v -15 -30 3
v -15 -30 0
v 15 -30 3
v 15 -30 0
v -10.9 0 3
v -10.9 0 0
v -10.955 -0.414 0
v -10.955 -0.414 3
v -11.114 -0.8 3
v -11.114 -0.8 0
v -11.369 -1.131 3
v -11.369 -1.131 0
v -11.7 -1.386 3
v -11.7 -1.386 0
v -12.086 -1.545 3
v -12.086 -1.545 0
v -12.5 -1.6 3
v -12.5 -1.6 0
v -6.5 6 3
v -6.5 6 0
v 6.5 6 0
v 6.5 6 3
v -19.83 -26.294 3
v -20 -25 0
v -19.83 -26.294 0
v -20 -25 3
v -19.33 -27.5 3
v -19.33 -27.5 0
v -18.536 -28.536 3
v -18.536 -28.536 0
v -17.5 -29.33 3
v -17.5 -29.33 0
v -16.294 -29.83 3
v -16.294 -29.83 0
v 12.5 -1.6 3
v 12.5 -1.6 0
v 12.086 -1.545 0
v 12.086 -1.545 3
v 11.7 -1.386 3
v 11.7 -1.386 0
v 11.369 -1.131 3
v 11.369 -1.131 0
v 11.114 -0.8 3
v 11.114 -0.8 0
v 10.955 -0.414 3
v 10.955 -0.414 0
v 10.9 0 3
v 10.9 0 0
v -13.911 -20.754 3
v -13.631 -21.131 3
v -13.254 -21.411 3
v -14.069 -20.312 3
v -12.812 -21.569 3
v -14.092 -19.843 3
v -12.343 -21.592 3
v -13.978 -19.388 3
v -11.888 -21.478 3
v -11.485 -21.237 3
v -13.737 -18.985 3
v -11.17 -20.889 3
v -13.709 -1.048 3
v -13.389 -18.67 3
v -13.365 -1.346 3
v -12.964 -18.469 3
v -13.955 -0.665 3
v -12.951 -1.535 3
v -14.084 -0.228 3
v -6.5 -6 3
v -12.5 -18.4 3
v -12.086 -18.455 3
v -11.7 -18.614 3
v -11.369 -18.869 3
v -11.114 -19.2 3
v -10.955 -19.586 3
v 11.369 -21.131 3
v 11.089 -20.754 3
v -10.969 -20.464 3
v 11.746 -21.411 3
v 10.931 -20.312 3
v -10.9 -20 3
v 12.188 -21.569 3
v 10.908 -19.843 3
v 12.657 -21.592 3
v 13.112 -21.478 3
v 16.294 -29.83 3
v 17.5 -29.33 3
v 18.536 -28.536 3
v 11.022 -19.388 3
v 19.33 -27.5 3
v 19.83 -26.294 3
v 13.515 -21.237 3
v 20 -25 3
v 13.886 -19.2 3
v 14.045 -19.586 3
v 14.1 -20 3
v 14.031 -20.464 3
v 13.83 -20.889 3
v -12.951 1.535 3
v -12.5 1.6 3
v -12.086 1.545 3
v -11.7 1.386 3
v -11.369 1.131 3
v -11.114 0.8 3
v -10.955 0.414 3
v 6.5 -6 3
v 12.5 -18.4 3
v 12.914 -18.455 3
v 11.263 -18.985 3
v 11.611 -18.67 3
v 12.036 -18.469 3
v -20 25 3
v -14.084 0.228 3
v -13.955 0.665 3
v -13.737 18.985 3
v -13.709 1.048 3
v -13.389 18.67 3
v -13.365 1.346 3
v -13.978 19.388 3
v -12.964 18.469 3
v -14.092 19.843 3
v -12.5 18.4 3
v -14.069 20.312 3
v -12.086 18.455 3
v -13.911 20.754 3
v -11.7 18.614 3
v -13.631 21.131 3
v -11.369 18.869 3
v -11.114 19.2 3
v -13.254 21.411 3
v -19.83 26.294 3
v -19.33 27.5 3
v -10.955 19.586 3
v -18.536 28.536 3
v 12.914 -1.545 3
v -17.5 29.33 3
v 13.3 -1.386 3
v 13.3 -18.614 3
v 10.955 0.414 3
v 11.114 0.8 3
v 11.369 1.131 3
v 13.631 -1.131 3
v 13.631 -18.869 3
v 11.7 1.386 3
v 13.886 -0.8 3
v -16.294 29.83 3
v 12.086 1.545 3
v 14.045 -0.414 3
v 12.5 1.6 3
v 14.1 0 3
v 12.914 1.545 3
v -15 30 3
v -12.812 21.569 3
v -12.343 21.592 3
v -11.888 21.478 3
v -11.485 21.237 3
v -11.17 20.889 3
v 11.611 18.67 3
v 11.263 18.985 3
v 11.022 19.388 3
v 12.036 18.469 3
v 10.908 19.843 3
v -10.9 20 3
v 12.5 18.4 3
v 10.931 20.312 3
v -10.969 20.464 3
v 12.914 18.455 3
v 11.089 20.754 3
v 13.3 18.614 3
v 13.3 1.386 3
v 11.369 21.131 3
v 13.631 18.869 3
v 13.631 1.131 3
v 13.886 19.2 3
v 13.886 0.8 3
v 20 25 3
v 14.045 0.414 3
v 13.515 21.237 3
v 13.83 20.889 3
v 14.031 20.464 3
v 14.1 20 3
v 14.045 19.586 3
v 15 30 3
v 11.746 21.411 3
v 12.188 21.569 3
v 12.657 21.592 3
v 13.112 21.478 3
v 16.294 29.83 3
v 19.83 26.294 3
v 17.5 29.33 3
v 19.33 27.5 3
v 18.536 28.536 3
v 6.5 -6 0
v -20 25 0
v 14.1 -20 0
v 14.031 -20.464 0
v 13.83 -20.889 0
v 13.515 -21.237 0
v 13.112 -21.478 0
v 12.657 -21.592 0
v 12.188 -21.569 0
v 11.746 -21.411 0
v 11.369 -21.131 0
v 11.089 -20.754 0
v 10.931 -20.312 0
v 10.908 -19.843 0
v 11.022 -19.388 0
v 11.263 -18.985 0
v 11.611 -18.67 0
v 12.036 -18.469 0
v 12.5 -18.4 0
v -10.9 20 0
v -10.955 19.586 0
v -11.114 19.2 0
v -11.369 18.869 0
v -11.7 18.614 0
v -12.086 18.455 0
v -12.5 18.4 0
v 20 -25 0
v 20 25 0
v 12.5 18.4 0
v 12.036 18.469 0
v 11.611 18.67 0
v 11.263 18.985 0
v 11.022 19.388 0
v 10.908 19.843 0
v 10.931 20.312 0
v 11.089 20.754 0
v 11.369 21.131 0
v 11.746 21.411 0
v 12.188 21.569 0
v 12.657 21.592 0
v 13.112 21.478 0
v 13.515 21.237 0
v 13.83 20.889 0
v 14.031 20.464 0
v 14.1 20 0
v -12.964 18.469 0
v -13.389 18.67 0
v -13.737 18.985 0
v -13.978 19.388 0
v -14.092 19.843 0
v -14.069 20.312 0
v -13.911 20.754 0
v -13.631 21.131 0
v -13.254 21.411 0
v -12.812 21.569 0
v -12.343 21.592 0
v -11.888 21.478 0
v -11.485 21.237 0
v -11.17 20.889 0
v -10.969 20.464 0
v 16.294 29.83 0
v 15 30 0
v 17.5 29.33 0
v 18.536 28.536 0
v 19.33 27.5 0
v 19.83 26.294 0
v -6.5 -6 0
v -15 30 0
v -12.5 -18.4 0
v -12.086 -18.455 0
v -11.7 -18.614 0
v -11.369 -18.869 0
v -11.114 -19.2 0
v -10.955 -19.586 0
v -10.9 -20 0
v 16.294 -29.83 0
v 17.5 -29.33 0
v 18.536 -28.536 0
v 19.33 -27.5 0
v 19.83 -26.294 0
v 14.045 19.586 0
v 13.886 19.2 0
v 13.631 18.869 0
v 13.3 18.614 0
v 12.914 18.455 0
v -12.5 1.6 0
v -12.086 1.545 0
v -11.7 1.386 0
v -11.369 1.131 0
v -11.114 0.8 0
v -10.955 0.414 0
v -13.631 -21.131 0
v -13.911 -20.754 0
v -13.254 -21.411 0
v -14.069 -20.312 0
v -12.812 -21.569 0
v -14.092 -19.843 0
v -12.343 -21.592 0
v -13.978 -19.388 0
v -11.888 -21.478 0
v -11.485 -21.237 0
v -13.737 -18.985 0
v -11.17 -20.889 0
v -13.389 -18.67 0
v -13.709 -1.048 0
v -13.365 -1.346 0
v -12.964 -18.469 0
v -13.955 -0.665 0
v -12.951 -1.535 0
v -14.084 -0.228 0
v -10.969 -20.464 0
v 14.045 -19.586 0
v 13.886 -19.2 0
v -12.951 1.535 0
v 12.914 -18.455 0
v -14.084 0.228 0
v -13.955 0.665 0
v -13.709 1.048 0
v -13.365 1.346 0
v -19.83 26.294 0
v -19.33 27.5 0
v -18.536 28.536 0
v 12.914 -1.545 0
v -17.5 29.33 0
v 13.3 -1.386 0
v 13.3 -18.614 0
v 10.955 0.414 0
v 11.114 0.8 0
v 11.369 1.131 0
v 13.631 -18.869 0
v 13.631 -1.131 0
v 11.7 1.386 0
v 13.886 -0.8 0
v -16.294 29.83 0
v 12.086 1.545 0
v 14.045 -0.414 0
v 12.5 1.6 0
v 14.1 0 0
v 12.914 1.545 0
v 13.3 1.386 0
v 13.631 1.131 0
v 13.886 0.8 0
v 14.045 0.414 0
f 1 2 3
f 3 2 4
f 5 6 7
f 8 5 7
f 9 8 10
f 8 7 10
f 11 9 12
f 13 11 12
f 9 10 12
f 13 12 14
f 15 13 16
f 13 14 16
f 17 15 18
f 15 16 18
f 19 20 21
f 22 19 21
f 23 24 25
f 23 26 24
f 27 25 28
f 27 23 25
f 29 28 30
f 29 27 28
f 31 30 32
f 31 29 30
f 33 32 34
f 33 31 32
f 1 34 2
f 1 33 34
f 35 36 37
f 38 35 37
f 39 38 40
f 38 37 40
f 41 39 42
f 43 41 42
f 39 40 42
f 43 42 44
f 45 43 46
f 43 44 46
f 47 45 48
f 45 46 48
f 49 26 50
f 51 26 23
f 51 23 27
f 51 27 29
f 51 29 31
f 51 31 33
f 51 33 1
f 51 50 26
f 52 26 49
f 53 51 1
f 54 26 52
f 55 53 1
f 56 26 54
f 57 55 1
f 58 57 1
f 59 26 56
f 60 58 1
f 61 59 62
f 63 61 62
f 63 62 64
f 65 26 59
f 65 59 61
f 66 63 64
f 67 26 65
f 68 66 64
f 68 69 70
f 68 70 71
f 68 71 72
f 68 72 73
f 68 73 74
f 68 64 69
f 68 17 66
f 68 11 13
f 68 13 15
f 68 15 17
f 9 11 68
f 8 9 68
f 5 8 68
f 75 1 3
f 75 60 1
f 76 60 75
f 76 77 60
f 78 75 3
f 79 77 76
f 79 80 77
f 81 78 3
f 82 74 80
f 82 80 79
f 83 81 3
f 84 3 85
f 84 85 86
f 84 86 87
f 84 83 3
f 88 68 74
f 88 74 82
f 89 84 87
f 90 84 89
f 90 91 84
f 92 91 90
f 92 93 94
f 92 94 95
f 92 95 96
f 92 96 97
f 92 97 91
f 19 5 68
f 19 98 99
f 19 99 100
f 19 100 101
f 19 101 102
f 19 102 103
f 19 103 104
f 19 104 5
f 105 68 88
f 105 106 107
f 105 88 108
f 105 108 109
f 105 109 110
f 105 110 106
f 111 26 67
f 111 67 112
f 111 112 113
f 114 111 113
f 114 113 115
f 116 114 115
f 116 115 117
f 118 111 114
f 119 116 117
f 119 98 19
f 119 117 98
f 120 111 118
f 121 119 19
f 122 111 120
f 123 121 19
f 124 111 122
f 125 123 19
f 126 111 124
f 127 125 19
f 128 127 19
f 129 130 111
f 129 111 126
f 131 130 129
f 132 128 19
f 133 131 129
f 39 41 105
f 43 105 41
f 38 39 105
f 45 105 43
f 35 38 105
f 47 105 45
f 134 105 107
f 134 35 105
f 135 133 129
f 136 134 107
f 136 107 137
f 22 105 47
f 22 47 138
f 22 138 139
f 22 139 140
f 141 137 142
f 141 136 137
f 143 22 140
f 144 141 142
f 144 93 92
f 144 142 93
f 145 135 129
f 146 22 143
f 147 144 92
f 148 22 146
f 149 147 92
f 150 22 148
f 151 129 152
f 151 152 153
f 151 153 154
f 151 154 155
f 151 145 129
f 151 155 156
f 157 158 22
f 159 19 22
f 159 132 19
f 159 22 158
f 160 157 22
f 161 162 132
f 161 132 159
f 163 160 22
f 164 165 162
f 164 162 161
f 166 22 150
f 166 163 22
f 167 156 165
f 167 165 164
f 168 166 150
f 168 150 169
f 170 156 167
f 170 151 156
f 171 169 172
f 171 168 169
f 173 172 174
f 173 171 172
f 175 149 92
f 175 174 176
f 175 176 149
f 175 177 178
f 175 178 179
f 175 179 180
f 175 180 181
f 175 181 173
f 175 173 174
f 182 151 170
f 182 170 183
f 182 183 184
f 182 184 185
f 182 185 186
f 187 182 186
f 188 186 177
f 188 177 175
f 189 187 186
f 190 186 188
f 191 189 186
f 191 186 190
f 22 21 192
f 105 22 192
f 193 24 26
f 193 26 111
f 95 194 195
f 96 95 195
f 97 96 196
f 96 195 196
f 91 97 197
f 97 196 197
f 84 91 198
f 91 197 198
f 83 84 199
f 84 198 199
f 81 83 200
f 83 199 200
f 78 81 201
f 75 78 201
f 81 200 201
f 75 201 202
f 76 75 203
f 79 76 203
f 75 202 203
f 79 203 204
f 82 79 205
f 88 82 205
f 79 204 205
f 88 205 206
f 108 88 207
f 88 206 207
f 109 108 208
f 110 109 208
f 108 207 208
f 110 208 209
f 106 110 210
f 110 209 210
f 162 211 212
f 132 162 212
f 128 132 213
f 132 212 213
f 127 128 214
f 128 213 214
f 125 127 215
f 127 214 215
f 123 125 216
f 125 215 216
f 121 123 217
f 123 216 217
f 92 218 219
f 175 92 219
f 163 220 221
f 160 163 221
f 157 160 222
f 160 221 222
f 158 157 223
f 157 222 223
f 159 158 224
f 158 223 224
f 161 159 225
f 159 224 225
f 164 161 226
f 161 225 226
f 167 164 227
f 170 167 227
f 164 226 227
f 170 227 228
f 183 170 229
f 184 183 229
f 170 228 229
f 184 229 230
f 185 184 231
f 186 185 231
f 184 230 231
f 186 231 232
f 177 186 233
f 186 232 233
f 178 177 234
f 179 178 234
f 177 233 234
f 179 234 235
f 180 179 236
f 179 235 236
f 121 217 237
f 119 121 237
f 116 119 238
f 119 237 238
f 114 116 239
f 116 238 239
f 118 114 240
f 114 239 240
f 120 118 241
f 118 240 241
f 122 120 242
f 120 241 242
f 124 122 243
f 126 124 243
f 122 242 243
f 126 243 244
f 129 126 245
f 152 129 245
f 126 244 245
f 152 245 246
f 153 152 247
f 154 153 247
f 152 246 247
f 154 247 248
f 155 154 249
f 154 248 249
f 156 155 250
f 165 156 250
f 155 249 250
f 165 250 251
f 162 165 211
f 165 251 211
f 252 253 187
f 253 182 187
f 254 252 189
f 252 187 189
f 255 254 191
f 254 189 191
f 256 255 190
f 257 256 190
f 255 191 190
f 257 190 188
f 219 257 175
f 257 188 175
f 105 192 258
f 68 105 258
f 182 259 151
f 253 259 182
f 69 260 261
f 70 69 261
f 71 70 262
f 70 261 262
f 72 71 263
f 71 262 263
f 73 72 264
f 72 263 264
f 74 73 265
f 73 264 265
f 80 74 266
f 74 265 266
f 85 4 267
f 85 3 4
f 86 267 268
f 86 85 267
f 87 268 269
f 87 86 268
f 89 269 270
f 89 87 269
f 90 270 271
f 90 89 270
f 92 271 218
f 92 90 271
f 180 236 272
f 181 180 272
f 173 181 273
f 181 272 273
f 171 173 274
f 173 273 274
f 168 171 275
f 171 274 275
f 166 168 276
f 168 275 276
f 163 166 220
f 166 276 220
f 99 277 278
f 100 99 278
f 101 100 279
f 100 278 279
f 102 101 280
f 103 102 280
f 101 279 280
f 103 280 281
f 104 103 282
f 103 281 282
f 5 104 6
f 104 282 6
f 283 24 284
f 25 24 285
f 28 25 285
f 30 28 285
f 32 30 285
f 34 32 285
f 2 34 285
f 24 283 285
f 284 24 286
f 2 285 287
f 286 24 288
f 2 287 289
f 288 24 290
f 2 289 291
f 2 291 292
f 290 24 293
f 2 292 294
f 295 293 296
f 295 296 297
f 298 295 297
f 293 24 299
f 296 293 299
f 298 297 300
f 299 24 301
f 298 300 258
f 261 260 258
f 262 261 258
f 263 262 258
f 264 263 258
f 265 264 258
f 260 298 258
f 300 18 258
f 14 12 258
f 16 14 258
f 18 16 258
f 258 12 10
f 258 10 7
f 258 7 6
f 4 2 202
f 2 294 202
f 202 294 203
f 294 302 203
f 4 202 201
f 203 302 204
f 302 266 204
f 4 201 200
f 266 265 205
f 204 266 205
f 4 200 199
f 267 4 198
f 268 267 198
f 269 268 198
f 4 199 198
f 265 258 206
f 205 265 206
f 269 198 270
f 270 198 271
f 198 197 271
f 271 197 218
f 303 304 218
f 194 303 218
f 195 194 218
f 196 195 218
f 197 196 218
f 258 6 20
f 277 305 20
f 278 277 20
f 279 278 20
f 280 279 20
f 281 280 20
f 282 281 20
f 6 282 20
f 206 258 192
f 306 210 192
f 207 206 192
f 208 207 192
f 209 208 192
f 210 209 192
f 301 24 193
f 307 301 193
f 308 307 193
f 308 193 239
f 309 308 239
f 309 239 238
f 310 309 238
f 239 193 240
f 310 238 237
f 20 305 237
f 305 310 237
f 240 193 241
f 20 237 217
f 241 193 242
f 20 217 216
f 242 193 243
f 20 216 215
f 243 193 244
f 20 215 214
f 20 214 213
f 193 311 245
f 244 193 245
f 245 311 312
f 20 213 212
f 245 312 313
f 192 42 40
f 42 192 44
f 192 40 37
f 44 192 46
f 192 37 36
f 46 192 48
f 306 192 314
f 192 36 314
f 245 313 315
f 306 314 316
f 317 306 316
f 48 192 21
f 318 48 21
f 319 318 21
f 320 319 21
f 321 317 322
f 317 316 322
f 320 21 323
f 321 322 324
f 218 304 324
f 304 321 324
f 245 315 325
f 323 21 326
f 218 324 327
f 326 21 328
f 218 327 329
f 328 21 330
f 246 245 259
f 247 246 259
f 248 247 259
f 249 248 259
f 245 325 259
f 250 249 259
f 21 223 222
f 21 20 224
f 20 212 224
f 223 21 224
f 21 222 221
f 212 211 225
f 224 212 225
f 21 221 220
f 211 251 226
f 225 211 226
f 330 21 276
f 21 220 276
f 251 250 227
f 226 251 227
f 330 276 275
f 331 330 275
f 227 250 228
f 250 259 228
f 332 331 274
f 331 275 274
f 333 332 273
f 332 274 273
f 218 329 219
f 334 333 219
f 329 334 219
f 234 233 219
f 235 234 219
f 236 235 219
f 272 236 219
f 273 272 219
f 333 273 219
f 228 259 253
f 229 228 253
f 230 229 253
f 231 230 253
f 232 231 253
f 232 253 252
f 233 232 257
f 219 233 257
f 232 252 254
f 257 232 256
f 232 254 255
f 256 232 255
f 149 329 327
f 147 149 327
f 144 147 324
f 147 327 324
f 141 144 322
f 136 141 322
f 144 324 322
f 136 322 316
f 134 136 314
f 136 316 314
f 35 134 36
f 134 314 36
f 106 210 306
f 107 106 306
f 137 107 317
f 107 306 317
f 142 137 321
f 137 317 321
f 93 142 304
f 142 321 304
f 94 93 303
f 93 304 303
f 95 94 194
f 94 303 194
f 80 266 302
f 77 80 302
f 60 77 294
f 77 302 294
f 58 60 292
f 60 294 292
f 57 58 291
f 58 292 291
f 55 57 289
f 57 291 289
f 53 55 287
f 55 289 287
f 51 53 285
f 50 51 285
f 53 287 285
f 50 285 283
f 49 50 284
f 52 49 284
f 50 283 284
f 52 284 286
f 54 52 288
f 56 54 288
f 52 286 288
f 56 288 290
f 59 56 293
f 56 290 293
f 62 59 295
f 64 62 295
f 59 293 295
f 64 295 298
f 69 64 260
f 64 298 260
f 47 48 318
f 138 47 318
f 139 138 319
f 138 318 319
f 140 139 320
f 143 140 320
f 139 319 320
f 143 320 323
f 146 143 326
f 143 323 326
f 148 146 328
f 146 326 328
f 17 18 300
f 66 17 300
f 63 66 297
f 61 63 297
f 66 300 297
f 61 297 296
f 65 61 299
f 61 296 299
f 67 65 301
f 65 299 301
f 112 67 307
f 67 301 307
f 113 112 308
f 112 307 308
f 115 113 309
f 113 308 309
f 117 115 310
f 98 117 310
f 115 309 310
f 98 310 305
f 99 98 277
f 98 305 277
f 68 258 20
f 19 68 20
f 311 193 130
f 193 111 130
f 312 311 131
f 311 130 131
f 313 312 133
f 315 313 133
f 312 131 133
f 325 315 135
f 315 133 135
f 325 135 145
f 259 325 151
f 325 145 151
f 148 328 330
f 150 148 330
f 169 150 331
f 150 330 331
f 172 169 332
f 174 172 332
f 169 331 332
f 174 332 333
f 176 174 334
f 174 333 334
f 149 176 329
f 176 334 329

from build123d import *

# Parameters (mm, degrees)
F0_W     = 40
F0_H     = 60
F1_DEPTH = 3
F2_R     = 5


with BuildPart() as f1:
    # F0 (on Top) → F1 (new body)
    with BuildSketch(Plane.XY):
        Rectangle(F0_W, F0_H)
        with BuildLine():
            ThreePointArc((-10.9, -20), (-13.6313708499, -21.1313708499), (-12.5, -18.4))
            ThreePointArc((-12.5, -18.4), (-11.3686291501, -18.8686291501), (-10.9, -20))
        make_face(mode=Mode.SUBTRACT)
        with BuildLine():
            ThreePointArc((14.1, -20), (11.3686291501, -21.1313708499), (12.5, -18.4))
            ThreePointArc((12.5, -18.4), (13.6313708499, -18.8686291501), (14.1, -20))
        make_face(mode=Mode.SUBTRACT)
        with BuildLine():
            ThreePointArc((-12.5, 1.6), (-11.3686291501, 1.1313708499), (-10.9, 0))
            ThreePointArc((-10.9, 0), (-11.3686291501, -1.1313708499), (-12.5, -1.6))
            ThreePointArc((-12.5, -1.6), (-14.1, 0), (-12.5, 1.6))
        make_face(mode=Mode.SUBTRACT)
        with BuildLine():
            ThreePointArc((-10.9, 20), (-11.3686291501, 18.8686291501), (-12.5, 18.4))
            ThreePointArc((-12.5, 18.4), (-13.6313708499, 21.1313708499), (-10.9, 20))
        make_face(mode=Mode.SUBTRACT)
        Polygon((6.5, 6), (6.5, 0), (6.5, -6), (-6.5, -6), (-6.5, 0), (-6.5, 6), align=None, mode=Mode.SUBTRACT)
        with BuildLine():
            ThreePointArc((12.5, -1.6), (11.3686291501, -1.1313708499), (10.9, 0))
            ThreePointArc((10.9, 0), (11.3686291501, 1.1313708499), (12.5, 1.6))
            ThreePointArc((12.5, 1.6), (13.6313708499, 1.1313708499), (14.1, 0))
            ThreePointArc((14.1, 0), (13.6313708499, -1.1313708499), (12.5, -1.6))
        make_face(mode=Mode.SUBTRACT)
        with BuildLine():
            ThreePointArc((14.1, 20), (13.6313708499, 18.8686291501), (12.5, 18.4))
            ThreePointArc((12.5, 18.4), (11.3686291501, 21.1313708499), (14.1, 20))
        make_face(mode=Mode.SUBTRACT)
    extrude(amount=F1_DEPTH)

    # F2
    f2_edges = [f1.edges().sort_by_distance(p)[0] for p in [
        (20, -30, 1.5),
        (20, 30, 1.5),
        (-20, -30, 1.5),
        (-20, 30, 1.5),
    ]]
    fillet(f2_edges, radius=F2_R)


solid = f1.part
